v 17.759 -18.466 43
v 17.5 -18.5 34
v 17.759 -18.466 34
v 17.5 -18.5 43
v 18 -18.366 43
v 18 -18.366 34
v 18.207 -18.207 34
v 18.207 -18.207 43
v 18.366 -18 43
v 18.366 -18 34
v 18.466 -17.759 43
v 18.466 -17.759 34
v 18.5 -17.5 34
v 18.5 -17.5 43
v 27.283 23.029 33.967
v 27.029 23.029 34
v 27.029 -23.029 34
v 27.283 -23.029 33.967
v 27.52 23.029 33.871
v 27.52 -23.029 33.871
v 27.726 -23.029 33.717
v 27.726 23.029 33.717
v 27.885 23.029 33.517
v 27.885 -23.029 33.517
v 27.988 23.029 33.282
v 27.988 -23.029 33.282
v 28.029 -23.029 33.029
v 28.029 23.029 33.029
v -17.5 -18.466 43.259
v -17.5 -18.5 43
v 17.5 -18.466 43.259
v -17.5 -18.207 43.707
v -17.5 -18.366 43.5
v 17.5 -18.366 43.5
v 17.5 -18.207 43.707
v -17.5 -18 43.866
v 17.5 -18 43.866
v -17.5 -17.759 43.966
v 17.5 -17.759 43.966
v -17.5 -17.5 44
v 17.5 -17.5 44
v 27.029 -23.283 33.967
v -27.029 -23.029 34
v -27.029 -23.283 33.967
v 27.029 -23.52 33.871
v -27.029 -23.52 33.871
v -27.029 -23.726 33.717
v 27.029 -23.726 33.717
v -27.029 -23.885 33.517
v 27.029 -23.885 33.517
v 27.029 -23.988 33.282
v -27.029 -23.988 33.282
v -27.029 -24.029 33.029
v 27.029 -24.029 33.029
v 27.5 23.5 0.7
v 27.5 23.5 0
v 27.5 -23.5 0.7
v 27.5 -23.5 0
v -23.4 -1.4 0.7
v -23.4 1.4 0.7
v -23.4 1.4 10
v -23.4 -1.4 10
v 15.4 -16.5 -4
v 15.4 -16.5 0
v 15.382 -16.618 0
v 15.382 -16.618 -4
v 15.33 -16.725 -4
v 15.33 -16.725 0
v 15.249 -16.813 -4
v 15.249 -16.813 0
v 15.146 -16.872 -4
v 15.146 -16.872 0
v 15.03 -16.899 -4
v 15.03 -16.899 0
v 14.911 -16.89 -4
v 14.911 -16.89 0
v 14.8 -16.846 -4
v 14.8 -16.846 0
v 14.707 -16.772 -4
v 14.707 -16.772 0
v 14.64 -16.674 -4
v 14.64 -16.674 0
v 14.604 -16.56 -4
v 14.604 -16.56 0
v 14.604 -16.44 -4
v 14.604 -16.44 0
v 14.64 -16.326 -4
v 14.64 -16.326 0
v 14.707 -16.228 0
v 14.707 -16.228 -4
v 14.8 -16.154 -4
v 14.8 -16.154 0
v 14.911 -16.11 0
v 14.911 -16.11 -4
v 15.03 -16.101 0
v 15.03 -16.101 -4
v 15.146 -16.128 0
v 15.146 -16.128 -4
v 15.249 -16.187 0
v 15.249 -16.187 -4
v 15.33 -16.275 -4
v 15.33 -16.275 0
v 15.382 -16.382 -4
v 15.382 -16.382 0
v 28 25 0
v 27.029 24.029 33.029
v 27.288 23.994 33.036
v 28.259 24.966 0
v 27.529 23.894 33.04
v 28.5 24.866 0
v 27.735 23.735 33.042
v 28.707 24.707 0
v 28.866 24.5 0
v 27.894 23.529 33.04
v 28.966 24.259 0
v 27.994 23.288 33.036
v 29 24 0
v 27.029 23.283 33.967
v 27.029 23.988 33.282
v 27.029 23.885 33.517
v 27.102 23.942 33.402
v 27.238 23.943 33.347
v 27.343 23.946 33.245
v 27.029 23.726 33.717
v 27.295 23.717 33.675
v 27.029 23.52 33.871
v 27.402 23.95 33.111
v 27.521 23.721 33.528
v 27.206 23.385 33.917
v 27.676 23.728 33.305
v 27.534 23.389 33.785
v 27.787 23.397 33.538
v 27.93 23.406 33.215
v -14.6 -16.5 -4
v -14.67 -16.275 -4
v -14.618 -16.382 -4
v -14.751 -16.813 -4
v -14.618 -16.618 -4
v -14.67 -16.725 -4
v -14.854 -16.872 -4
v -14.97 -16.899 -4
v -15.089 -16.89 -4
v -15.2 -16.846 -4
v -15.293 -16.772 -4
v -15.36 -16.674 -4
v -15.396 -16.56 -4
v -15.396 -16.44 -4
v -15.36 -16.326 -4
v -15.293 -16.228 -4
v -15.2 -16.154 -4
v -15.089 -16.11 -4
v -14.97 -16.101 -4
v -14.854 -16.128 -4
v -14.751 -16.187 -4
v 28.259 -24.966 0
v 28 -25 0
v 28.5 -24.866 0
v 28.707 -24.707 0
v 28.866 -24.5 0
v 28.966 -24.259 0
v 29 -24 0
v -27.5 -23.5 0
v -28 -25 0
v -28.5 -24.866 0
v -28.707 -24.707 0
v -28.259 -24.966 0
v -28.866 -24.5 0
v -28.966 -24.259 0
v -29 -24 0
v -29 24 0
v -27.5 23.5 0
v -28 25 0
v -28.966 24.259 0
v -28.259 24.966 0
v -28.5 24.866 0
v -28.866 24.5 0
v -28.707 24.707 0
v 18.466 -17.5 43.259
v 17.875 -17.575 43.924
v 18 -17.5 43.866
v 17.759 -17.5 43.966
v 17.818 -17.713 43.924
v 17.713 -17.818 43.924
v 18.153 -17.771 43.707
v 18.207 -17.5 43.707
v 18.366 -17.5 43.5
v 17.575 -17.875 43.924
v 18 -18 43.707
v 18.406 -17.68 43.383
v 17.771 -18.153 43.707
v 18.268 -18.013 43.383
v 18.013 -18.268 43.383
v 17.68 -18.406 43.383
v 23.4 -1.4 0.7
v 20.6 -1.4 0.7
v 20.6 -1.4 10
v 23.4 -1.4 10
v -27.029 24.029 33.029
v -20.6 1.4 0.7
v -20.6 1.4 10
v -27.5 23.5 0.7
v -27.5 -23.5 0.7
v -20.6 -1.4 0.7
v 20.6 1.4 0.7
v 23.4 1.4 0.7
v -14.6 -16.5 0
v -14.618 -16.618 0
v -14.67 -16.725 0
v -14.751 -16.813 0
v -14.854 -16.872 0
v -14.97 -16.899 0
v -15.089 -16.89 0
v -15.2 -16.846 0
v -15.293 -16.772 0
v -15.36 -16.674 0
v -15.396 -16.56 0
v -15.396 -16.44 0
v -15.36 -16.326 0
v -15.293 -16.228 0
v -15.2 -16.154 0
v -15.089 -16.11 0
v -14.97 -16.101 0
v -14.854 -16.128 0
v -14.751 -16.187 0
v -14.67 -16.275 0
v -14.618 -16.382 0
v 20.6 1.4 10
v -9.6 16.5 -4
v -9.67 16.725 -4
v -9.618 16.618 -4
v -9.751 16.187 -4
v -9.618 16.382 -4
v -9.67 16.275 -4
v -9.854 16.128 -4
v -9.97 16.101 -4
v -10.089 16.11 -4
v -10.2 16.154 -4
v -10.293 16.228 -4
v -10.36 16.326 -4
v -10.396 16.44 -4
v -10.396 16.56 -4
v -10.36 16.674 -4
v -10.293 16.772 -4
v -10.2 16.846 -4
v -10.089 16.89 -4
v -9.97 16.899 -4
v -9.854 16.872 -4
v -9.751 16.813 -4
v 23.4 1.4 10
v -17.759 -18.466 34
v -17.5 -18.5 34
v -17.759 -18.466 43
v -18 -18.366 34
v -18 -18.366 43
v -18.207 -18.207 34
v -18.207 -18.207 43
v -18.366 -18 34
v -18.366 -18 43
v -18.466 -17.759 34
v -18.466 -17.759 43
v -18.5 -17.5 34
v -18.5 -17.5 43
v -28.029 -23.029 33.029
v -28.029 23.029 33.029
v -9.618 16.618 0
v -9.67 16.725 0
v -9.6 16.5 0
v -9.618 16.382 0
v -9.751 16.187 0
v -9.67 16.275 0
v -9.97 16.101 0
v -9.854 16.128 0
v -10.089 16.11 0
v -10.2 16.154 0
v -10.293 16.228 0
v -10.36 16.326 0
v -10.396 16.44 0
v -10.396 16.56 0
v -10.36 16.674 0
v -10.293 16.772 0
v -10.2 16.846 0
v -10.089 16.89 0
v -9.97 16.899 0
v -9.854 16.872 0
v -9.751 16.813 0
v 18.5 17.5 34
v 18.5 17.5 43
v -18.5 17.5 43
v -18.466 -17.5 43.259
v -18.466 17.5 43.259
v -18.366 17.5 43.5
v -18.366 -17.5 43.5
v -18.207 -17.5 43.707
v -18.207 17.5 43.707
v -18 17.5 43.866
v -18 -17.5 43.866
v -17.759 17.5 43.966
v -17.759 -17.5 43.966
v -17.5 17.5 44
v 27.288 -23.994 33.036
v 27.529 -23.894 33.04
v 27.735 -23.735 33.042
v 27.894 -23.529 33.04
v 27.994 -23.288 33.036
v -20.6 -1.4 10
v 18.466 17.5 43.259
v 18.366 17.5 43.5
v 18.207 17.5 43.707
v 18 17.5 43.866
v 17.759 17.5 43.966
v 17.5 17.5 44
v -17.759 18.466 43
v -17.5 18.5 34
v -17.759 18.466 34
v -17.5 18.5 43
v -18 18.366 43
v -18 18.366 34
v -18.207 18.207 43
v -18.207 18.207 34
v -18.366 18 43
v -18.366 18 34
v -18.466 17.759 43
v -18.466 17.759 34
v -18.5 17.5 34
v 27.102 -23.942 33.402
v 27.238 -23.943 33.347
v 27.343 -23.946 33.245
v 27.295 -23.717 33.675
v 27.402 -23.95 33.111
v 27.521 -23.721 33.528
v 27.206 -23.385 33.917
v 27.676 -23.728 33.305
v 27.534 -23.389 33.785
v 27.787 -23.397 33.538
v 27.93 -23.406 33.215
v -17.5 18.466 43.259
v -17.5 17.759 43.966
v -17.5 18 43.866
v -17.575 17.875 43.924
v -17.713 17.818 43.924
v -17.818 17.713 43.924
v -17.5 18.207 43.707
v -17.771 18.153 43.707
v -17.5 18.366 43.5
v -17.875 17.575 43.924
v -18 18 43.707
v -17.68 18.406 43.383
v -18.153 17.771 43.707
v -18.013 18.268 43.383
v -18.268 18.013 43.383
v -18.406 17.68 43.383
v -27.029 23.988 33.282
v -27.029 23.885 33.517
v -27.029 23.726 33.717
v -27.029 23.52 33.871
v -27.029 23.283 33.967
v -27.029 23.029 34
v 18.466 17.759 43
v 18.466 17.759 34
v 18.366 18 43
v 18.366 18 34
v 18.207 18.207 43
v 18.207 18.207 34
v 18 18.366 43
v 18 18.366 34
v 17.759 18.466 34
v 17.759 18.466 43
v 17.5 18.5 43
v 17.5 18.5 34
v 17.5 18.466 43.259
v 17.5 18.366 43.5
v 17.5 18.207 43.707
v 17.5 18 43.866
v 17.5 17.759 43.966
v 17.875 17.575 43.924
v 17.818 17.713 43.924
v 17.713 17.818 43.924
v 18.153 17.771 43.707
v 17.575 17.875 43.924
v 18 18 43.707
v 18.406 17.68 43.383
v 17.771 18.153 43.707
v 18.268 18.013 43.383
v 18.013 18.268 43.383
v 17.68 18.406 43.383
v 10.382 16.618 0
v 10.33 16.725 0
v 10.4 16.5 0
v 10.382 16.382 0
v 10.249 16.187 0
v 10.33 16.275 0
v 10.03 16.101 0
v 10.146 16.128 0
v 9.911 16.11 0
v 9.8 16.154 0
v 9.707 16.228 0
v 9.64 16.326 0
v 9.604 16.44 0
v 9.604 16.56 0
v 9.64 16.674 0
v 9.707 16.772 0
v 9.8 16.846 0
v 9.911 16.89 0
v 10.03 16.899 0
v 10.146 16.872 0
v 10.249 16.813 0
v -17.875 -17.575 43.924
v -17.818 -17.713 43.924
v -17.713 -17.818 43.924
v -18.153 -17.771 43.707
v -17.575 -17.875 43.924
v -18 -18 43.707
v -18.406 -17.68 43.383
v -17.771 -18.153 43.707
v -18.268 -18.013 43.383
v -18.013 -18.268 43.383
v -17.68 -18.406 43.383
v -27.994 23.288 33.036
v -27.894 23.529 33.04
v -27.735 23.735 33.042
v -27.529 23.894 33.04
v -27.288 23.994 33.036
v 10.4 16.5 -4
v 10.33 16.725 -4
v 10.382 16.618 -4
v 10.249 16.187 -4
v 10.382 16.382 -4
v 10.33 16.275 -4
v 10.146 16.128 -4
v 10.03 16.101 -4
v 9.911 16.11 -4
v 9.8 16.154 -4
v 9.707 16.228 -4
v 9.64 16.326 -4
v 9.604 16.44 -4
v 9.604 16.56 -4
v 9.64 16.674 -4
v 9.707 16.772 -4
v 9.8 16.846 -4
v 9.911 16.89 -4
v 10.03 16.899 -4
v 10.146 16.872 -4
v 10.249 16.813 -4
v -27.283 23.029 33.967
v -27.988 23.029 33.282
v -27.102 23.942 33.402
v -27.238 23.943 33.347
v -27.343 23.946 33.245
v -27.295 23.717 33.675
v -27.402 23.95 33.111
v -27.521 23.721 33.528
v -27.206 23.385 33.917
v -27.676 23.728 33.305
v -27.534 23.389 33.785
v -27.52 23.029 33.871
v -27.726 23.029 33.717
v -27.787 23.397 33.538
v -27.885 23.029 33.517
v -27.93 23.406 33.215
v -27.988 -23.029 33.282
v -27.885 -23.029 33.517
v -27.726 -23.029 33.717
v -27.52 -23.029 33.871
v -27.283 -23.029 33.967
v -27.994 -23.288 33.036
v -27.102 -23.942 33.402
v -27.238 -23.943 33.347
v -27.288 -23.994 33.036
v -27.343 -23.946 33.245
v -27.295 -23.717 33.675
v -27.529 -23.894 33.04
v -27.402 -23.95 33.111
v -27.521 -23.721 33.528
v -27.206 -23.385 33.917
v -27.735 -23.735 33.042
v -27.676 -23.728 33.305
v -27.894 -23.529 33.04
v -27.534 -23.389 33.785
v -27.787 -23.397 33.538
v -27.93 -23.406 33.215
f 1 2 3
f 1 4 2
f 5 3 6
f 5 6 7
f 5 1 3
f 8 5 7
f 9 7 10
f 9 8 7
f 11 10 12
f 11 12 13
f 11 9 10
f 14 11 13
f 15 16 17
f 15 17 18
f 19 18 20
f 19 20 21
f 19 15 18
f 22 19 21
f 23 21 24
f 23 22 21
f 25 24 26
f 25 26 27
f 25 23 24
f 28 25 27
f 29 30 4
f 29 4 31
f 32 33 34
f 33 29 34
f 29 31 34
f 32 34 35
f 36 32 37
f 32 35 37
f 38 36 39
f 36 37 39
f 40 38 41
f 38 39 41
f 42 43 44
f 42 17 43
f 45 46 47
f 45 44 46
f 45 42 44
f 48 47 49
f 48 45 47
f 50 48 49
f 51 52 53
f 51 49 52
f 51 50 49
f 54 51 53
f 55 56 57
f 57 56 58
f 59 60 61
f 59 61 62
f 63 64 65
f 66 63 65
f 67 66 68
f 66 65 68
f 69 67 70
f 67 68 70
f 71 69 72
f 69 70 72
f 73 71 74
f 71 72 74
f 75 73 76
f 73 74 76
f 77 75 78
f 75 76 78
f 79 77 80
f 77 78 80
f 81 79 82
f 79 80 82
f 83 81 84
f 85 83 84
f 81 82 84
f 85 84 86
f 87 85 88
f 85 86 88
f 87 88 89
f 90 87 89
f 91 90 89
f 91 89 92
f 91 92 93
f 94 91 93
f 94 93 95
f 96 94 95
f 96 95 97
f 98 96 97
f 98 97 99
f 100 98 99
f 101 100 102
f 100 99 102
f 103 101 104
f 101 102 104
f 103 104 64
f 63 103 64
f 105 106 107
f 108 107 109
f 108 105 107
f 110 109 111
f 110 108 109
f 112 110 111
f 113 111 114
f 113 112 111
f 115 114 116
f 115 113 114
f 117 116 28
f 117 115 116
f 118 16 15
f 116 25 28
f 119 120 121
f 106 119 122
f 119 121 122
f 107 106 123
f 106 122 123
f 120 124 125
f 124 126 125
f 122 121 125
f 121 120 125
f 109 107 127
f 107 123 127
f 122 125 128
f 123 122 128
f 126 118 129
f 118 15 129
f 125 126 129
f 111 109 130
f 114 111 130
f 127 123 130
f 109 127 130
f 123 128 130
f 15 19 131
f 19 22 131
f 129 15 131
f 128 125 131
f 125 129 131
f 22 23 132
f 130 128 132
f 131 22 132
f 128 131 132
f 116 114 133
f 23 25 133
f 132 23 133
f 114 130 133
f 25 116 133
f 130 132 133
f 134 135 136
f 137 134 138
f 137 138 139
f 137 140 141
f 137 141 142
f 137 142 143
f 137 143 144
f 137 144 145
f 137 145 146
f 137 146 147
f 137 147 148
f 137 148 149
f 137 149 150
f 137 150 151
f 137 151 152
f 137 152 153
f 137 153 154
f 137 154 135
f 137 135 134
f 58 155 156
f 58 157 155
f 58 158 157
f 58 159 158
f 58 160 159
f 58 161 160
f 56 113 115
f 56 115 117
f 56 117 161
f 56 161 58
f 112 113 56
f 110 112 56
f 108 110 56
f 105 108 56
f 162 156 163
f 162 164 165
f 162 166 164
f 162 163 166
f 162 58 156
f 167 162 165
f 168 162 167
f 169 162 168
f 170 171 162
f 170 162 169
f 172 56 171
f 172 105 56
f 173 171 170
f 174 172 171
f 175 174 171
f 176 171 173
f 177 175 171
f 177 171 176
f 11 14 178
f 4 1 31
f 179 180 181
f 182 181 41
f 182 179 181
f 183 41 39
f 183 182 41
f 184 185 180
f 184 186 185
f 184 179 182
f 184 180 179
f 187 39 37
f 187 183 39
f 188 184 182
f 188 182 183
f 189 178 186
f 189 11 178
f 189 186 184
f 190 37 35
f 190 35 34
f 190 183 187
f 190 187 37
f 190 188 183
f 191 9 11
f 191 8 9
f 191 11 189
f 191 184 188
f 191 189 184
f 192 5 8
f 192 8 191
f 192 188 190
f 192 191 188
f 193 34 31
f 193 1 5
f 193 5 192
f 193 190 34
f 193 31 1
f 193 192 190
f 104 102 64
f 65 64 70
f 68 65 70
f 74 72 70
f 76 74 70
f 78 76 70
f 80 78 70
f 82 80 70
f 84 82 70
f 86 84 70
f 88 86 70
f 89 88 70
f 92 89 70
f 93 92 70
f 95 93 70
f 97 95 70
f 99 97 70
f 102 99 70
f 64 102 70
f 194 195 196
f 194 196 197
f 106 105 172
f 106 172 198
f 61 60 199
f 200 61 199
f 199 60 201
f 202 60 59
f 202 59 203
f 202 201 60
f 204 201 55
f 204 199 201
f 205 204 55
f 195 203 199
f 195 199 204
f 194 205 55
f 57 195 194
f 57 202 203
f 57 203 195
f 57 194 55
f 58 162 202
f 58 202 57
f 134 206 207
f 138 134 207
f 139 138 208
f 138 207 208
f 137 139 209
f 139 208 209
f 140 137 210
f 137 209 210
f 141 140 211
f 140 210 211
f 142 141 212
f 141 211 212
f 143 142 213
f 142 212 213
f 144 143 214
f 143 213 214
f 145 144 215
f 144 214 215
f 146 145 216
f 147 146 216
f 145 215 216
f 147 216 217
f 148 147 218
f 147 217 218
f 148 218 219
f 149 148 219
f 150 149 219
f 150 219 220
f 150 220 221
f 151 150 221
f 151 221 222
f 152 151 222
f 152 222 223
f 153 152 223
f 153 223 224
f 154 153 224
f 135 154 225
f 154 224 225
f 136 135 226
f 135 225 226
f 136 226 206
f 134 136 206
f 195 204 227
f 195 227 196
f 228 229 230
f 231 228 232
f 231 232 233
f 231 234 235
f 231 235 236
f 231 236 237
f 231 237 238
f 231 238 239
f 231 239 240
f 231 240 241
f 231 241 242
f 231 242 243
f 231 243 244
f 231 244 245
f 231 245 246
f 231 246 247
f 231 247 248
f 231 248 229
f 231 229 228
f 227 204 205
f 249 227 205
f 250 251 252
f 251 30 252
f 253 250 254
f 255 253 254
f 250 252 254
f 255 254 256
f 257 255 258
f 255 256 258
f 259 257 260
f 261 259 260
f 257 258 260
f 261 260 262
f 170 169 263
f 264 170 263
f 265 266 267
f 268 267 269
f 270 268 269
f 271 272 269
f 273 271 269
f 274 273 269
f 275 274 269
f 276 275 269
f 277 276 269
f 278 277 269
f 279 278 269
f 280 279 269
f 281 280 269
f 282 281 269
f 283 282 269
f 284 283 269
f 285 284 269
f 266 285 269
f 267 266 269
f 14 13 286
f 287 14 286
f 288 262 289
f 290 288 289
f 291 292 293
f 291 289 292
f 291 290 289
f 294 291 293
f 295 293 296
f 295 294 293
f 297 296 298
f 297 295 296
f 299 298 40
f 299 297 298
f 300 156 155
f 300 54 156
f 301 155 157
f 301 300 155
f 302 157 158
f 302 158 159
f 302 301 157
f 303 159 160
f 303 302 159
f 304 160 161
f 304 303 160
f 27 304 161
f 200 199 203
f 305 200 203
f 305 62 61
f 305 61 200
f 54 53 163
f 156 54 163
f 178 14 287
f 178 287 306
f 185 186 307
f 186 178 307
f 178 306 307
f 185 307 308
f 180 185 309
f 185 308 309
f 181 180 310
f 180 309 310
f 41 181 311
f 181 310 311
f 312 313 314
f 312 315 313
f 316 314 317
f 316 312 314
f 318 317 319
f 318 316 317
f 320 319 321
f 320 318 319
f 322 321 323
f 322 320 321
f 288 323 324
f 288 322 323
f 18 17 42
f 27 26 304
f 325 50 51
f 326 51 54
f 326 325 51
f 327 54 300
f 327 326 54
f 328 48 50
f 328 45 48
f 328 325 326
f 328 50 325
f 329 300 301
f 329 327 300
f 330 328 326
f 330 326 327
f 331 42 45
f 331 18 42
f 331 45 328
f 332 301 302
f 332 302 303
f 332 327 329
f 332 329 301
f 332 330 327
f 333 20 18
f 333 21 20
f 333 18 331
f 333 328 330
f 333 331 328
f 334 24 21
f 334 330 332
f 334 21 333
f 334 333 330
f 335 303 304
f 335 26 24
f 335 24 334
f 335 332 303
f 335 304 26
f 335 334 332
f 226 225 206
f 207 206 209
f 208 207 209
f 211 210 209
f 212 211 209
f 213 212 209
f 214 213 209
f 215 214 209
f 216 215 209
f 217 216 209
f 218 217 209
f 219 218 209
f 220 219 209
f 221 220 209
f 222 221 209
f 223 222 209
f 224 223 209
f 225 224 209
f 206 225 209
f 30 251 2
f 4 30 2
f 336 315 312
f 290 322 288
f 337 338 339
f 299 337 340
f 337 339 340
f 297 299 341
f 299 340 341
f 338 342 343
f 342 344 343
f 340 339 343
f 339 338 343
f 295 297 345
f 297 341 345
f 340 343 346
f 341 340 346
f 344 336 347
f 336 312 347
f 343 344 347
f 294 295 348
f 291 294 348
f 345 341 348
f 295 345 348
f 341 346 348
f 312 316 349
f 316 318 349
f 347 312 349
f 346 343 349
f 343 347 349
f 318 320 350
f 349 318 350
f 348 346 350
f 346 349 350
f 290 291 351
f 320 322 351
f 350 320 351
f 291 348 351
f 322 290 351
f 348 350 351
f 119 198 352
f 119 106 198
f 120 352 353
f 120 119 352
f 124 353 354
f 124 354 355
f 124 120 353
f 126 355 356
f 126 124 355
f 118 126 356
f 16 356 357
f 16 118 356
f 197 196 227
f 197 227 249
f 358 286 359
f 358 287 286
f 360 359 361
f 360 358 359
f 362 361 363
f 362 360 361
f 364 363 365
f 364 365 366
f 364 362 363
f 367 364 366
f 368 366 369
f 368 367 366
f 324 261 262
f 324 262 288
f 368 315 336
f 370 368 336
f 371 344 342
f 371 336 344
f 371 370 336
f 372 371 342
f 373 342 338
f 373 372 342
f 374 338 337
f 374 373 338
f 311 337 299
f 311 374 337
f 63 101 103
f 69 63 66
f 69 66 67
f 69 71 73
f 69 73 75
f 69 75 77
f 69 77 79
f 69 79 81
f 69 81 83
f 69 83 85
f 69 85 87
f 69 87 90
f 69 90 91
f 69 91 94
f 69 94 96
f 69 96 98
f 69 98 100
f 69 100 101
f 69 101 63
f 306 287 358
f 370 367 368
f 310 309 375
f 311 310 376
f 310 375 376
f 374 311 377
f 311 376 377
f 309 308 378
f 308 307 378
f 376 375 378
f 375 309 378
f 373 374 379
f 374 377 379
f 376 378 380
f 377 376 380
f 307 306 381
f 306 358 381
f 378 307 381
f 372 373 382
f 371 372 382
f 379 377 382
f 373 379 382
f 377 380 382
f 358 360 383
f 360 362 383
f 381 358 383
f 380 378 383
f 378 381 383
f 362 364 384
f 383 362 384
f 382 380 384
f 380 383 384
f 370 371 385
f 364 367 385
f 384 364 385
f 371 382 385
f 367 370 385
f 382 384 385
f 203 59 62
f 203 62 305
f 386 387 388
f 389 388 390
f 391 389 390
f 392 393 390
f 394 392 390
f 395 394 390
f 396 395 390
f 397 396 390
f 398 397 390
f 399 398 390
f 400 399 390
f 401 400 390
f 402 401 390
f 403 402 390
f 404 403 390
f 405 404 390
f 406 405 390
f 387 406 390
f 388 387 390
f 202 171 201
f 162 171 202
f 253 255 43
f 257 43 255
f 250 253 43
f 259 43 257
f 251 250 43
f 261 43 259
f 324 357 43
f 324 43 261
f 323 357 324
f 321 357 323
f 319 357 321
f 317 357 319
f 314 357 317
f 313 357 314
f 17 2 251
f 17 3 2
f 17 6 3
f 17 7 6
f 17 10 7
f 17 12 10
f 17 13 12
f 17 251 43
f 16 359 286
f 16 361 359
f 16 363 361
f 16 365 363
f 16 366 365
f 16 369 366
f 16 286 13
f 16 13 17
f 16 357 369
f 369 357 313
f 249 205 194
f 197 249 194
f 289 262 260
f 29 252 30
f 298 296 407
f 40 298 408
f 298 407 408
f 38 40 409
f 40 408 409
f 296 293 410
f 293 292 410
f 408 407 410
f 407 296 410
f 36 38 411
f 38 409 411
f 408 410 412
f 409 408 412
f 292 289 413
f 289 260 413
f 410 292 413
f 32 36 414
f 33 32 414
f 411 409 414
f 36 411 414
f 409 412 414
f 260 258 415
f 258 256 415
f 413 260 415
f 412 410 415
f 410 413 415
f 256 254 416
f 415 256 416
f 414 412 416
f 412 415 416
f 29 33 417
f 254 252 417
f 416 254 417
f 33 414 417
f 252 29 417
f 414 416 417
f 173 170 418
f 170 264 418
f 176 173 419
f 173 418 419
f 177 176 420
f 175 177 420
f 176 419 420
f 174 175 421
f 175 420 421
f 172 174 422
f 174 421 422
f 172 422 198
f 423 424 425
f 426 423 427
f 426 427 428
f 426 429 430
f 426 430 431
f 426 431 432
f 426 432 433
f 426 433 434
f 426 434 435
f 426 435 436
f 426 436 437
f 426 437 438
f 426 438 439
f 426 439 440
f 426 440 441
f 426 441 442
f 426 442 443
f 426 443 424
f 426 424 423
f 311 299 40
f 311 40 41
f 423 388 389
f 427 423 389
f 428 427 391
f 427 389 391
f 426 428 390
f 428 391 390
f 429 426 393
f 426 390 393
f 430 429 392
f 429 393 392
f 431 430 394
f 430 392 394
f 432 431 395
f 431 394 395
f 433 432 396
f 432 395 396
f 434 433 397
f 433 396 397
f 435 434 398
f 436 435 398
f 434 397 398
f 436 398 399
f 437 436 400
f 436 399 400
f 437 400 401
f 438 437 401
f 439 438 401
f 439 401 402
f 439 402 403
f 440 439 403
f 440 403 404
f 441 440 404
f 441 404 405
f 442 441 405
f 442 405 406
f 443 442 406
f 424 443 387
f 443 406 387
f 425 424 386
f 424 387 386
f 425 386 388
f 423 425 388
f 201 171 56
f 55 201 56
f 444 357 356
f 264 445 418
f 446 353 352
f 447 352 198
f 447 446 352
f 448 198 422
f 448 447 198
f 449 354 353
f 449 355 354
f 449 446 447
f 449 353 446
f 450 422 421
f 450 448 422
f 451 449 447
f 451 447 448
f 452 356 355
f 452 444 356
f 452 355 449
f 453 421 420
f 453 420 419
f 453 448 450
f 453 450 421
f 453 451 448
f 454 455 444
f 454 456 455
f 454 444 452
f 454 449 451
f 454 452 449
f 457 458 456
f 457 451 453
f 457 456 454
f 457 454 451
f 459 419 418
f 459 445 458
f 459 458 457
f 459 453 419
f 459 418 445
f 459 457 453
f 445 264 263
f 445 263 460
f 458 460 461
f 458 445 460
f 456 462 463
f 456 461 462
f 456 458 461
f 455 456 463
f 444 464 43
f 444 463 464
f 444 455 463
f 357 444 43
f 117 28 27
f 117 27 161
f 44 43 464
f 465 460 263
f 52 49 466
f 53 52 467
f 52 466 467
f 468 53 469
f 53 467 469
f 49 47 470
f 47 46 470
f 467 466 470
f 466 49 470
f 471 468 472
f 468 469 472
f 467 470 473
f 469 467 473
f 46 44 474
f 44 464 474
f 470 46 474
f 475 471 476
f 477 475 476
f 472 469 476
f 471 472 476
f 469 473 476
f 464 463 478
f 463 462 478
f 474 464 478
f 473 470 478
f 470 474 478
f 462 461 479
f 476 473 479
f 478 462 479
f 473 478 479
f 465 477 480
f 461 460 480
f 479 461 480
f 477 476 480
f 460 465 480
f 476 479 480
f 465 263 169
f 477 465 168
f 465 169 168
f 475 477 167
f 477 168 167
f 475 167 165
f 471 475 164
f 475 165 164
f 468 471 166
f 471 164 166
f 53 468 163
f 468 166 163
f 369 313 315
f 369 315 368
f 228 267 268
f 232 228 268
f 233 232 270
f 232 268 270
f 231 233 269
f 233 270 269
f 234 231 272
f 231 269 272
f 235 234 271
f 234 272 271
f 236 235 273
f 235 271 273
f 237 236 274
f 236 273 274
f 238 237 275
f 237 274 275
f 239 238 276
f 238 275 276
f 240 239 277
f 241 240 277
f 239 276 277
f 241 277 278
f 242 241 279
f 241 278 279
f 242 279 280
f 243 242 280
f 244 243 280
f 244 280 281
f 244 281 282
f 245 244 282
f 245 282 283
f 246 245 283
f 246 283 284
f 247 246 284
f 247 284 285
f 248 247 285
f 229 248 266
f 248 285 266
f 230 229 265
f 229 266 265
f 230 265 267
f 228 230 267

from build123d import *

# Parameters (mm, degrees)
EXTRUDE_3_DEPTH          = 25
CUT_EXTRUDE_1_DEPTH      = 52.205468458
CUT_EXTRUDE_1_DEPTH_BACK = 52.205468458
SKETCH_3_OUTSIDE_W       = 52.758
SKETCH_3_OUTSIDE_H       = 68.758
SKETCH_4_W               = 37
SKETCH_4_H               = 37
EXTRUDE_4_DEPTH          = 10
SKETCH_8_W               = 2.8
SKETCH_8_H               = 2.8
CUT_EXTRUDE_3_DEPTH      = 10
SKETCH_5_W               = 55
SKETCH_5_H               = 47
CUT_EXTRUDE_2_DEPTH      = 0.7
FILLET_1_R               = 1
EXTRUDE_START            = 0.7
SKETCH_7_R               = 0.4
EXTRUDE_5_DEPTH          = 4
EXTRUDE_5_2_DEPTH        = 4
EXTRUDE_5_3_DEPTH        = 4
EXTRUDE_5_4_DEPTH        = 4


with BuildPart() as part:
    # Эскиз1 → Бобышка-Вытянуть3 (new, symmetric)
    with BuildSketch(Plane(origin=(0, 0, 0), x_dir=(1, 0, 0), z_dir=(0, 1, 0))):
        Polygon((-29, 0), (-28, -34), (28, -34), (29, 0), align=None)
    extrude(amount=EXTRUDE_3_DEPTH, both=True)

    # Эскиз3 outside → Вырез-Вытянуть1 (cut, two sides: drawn at the far end of the back side and taken through both)
    with BuildSketch(Plane(origin=(0, 0, 0), x_dir=(0, 0, -1), z_dir=(1, 0, 0)).offset(-CUT_EXTRUDE_1_DEPTH_BACK)):
        with Locations((-17, 0)):
            Rectangle(SKETCH_3_OUTSIDE_W, SKETCH_3_OUTSIDE_H)
        Polygon((0, 25), (-34, 24), (-34, -24), (0, -25), align=None, mode=Mode.SUBTRACT)
    extrude(amount=CUT_EXTRUDE_1_DEPTH + CUT_EXTRUDE_1_DEPTH_BACK, mode=Mode.SUBTRACT)

    # Эскиз4 → Бобышка-Вытянуть4 (add)
    with BuildSketch(Plane.XY.offset(34)):
        Rectangle(SKETCH_4_W, SKETCH_4_H)
    extrude(amount=EXTRUDE_4_DEPTH)

    # Эскиз8 → Вырез-Вытянуть3 (cut)
    with BuildSketch(Plane(origin=(0, 0, 0), x_dir=(1, 0, 0), z_dir=(0, 0, -1))):
        with Locations((22, 0)):
            Rectangle(SKETCH_8_W, SKETCH_8_H)
        with Locations((-22, 0)):
            Rectangle(SKETCH_8_W, SKETCH_8_H)
    extrude(amount=-CUT_EXTRUDE_3_DEPTH, mode=Mode.SUBTRACT)

    # Эскиз5 → Вырез-Вытянуть2 (cut)
    with BuildSketch(Plane(origin=(0, 0, 0), x_dir=(1, 0, 0), z_dir=(0, 0, -1))):
        Rectangle(SKETCH_5_W, SKETCH_5_H)
    extrude(amount=-CUT_EXTRUDE_2_DEPTH, mode=Mode.SUBTRACT)

    # Скругление1
    fillet_1_edges = [part.edges().sort_by_distance(p)[0] for p in [
        (28, 0, 34),
        (-28, 0, 34),
        (0, -24, 34),
        (0, 24, 34),
        (-28.5, 24.5, 17),
        (28.5, 24.5, 17),
        (-28.5, -24.5, 17),
        (28.5, -24.5, 17),
        (18.5, -18.5, 39),
        (18.5, 18.5, 39),
        (-18.5, 18.5, 39),
        (-18.5, -18.5, 39),
        (18.5, 0, 44),
        (0, 18.5, 44),
        (-18.5, 0, 44),
        (0, -18.5, 44),
    ]]
    fillet(fillet_1_edges, radius=FILLET_1_R)


with BuildPart() as body_2:
    # Эскиз7 → Бобышка-Вытянуть5 (new body)
    with BuildSketch(Plane(origin=(0, -0.7, 0.7), x_dir=(1, 0, 0), z_dir=(0, 0, -1)).offset(EXTRUDE_START)):
        with Locations((-15, 15.8)):
            Circle(SKETCH_7_R)
    extrude(amount=EXTRUDE_5_DEPTH)


with BuildPart() as body_3:
    # Эскиз7 → Extrude 5 2 (new body)
    with BuildSketch(Plane(origin=(0, -0.7, 0.7), x_dir=(1, 0, 0), z_dir=(0, 0, -1)).offset(EXTRUDE_START)):
        with Locations((15, 15.8)):
            Circle(SKETCH_7_R)
    extrude(amount=EXTRUDE_5_2_DEPTH)


with BuildPart() as body_4:
    # Эскиз7 → Extrude 5 3 (new body)
    with BuildSketch(Plane(origin=(0, -0.7, 0.7), x_dir=(1, 0, 0), z_dir=(0, 0, -1)).offset(EXTRUDE_START)):
        with Locations((-10, -17.2)):
            Circle(SKETCH_7_R)
    extrude(amount=EXTRUDE_5_3_DEPTH)


with BuildPart() as body_5:
    # Эскиз7 → Extrude 5 4 (new body)
    with BuildSketch(Plane(origin=(0, -0.7, 0.7), x_dir=(1, 0, 0), z_dir=(0, 0, -1)).offset(EXTRUDE_START)):
        with Locations((10, -17.2)):
            Circle(SKETCH_7_R)
    extrude(amount=EXTRUDE_5_4_DEPTH)


solid = Compound([part.part, body_2.part, body_3.part, body_4.part, body_5.part])
